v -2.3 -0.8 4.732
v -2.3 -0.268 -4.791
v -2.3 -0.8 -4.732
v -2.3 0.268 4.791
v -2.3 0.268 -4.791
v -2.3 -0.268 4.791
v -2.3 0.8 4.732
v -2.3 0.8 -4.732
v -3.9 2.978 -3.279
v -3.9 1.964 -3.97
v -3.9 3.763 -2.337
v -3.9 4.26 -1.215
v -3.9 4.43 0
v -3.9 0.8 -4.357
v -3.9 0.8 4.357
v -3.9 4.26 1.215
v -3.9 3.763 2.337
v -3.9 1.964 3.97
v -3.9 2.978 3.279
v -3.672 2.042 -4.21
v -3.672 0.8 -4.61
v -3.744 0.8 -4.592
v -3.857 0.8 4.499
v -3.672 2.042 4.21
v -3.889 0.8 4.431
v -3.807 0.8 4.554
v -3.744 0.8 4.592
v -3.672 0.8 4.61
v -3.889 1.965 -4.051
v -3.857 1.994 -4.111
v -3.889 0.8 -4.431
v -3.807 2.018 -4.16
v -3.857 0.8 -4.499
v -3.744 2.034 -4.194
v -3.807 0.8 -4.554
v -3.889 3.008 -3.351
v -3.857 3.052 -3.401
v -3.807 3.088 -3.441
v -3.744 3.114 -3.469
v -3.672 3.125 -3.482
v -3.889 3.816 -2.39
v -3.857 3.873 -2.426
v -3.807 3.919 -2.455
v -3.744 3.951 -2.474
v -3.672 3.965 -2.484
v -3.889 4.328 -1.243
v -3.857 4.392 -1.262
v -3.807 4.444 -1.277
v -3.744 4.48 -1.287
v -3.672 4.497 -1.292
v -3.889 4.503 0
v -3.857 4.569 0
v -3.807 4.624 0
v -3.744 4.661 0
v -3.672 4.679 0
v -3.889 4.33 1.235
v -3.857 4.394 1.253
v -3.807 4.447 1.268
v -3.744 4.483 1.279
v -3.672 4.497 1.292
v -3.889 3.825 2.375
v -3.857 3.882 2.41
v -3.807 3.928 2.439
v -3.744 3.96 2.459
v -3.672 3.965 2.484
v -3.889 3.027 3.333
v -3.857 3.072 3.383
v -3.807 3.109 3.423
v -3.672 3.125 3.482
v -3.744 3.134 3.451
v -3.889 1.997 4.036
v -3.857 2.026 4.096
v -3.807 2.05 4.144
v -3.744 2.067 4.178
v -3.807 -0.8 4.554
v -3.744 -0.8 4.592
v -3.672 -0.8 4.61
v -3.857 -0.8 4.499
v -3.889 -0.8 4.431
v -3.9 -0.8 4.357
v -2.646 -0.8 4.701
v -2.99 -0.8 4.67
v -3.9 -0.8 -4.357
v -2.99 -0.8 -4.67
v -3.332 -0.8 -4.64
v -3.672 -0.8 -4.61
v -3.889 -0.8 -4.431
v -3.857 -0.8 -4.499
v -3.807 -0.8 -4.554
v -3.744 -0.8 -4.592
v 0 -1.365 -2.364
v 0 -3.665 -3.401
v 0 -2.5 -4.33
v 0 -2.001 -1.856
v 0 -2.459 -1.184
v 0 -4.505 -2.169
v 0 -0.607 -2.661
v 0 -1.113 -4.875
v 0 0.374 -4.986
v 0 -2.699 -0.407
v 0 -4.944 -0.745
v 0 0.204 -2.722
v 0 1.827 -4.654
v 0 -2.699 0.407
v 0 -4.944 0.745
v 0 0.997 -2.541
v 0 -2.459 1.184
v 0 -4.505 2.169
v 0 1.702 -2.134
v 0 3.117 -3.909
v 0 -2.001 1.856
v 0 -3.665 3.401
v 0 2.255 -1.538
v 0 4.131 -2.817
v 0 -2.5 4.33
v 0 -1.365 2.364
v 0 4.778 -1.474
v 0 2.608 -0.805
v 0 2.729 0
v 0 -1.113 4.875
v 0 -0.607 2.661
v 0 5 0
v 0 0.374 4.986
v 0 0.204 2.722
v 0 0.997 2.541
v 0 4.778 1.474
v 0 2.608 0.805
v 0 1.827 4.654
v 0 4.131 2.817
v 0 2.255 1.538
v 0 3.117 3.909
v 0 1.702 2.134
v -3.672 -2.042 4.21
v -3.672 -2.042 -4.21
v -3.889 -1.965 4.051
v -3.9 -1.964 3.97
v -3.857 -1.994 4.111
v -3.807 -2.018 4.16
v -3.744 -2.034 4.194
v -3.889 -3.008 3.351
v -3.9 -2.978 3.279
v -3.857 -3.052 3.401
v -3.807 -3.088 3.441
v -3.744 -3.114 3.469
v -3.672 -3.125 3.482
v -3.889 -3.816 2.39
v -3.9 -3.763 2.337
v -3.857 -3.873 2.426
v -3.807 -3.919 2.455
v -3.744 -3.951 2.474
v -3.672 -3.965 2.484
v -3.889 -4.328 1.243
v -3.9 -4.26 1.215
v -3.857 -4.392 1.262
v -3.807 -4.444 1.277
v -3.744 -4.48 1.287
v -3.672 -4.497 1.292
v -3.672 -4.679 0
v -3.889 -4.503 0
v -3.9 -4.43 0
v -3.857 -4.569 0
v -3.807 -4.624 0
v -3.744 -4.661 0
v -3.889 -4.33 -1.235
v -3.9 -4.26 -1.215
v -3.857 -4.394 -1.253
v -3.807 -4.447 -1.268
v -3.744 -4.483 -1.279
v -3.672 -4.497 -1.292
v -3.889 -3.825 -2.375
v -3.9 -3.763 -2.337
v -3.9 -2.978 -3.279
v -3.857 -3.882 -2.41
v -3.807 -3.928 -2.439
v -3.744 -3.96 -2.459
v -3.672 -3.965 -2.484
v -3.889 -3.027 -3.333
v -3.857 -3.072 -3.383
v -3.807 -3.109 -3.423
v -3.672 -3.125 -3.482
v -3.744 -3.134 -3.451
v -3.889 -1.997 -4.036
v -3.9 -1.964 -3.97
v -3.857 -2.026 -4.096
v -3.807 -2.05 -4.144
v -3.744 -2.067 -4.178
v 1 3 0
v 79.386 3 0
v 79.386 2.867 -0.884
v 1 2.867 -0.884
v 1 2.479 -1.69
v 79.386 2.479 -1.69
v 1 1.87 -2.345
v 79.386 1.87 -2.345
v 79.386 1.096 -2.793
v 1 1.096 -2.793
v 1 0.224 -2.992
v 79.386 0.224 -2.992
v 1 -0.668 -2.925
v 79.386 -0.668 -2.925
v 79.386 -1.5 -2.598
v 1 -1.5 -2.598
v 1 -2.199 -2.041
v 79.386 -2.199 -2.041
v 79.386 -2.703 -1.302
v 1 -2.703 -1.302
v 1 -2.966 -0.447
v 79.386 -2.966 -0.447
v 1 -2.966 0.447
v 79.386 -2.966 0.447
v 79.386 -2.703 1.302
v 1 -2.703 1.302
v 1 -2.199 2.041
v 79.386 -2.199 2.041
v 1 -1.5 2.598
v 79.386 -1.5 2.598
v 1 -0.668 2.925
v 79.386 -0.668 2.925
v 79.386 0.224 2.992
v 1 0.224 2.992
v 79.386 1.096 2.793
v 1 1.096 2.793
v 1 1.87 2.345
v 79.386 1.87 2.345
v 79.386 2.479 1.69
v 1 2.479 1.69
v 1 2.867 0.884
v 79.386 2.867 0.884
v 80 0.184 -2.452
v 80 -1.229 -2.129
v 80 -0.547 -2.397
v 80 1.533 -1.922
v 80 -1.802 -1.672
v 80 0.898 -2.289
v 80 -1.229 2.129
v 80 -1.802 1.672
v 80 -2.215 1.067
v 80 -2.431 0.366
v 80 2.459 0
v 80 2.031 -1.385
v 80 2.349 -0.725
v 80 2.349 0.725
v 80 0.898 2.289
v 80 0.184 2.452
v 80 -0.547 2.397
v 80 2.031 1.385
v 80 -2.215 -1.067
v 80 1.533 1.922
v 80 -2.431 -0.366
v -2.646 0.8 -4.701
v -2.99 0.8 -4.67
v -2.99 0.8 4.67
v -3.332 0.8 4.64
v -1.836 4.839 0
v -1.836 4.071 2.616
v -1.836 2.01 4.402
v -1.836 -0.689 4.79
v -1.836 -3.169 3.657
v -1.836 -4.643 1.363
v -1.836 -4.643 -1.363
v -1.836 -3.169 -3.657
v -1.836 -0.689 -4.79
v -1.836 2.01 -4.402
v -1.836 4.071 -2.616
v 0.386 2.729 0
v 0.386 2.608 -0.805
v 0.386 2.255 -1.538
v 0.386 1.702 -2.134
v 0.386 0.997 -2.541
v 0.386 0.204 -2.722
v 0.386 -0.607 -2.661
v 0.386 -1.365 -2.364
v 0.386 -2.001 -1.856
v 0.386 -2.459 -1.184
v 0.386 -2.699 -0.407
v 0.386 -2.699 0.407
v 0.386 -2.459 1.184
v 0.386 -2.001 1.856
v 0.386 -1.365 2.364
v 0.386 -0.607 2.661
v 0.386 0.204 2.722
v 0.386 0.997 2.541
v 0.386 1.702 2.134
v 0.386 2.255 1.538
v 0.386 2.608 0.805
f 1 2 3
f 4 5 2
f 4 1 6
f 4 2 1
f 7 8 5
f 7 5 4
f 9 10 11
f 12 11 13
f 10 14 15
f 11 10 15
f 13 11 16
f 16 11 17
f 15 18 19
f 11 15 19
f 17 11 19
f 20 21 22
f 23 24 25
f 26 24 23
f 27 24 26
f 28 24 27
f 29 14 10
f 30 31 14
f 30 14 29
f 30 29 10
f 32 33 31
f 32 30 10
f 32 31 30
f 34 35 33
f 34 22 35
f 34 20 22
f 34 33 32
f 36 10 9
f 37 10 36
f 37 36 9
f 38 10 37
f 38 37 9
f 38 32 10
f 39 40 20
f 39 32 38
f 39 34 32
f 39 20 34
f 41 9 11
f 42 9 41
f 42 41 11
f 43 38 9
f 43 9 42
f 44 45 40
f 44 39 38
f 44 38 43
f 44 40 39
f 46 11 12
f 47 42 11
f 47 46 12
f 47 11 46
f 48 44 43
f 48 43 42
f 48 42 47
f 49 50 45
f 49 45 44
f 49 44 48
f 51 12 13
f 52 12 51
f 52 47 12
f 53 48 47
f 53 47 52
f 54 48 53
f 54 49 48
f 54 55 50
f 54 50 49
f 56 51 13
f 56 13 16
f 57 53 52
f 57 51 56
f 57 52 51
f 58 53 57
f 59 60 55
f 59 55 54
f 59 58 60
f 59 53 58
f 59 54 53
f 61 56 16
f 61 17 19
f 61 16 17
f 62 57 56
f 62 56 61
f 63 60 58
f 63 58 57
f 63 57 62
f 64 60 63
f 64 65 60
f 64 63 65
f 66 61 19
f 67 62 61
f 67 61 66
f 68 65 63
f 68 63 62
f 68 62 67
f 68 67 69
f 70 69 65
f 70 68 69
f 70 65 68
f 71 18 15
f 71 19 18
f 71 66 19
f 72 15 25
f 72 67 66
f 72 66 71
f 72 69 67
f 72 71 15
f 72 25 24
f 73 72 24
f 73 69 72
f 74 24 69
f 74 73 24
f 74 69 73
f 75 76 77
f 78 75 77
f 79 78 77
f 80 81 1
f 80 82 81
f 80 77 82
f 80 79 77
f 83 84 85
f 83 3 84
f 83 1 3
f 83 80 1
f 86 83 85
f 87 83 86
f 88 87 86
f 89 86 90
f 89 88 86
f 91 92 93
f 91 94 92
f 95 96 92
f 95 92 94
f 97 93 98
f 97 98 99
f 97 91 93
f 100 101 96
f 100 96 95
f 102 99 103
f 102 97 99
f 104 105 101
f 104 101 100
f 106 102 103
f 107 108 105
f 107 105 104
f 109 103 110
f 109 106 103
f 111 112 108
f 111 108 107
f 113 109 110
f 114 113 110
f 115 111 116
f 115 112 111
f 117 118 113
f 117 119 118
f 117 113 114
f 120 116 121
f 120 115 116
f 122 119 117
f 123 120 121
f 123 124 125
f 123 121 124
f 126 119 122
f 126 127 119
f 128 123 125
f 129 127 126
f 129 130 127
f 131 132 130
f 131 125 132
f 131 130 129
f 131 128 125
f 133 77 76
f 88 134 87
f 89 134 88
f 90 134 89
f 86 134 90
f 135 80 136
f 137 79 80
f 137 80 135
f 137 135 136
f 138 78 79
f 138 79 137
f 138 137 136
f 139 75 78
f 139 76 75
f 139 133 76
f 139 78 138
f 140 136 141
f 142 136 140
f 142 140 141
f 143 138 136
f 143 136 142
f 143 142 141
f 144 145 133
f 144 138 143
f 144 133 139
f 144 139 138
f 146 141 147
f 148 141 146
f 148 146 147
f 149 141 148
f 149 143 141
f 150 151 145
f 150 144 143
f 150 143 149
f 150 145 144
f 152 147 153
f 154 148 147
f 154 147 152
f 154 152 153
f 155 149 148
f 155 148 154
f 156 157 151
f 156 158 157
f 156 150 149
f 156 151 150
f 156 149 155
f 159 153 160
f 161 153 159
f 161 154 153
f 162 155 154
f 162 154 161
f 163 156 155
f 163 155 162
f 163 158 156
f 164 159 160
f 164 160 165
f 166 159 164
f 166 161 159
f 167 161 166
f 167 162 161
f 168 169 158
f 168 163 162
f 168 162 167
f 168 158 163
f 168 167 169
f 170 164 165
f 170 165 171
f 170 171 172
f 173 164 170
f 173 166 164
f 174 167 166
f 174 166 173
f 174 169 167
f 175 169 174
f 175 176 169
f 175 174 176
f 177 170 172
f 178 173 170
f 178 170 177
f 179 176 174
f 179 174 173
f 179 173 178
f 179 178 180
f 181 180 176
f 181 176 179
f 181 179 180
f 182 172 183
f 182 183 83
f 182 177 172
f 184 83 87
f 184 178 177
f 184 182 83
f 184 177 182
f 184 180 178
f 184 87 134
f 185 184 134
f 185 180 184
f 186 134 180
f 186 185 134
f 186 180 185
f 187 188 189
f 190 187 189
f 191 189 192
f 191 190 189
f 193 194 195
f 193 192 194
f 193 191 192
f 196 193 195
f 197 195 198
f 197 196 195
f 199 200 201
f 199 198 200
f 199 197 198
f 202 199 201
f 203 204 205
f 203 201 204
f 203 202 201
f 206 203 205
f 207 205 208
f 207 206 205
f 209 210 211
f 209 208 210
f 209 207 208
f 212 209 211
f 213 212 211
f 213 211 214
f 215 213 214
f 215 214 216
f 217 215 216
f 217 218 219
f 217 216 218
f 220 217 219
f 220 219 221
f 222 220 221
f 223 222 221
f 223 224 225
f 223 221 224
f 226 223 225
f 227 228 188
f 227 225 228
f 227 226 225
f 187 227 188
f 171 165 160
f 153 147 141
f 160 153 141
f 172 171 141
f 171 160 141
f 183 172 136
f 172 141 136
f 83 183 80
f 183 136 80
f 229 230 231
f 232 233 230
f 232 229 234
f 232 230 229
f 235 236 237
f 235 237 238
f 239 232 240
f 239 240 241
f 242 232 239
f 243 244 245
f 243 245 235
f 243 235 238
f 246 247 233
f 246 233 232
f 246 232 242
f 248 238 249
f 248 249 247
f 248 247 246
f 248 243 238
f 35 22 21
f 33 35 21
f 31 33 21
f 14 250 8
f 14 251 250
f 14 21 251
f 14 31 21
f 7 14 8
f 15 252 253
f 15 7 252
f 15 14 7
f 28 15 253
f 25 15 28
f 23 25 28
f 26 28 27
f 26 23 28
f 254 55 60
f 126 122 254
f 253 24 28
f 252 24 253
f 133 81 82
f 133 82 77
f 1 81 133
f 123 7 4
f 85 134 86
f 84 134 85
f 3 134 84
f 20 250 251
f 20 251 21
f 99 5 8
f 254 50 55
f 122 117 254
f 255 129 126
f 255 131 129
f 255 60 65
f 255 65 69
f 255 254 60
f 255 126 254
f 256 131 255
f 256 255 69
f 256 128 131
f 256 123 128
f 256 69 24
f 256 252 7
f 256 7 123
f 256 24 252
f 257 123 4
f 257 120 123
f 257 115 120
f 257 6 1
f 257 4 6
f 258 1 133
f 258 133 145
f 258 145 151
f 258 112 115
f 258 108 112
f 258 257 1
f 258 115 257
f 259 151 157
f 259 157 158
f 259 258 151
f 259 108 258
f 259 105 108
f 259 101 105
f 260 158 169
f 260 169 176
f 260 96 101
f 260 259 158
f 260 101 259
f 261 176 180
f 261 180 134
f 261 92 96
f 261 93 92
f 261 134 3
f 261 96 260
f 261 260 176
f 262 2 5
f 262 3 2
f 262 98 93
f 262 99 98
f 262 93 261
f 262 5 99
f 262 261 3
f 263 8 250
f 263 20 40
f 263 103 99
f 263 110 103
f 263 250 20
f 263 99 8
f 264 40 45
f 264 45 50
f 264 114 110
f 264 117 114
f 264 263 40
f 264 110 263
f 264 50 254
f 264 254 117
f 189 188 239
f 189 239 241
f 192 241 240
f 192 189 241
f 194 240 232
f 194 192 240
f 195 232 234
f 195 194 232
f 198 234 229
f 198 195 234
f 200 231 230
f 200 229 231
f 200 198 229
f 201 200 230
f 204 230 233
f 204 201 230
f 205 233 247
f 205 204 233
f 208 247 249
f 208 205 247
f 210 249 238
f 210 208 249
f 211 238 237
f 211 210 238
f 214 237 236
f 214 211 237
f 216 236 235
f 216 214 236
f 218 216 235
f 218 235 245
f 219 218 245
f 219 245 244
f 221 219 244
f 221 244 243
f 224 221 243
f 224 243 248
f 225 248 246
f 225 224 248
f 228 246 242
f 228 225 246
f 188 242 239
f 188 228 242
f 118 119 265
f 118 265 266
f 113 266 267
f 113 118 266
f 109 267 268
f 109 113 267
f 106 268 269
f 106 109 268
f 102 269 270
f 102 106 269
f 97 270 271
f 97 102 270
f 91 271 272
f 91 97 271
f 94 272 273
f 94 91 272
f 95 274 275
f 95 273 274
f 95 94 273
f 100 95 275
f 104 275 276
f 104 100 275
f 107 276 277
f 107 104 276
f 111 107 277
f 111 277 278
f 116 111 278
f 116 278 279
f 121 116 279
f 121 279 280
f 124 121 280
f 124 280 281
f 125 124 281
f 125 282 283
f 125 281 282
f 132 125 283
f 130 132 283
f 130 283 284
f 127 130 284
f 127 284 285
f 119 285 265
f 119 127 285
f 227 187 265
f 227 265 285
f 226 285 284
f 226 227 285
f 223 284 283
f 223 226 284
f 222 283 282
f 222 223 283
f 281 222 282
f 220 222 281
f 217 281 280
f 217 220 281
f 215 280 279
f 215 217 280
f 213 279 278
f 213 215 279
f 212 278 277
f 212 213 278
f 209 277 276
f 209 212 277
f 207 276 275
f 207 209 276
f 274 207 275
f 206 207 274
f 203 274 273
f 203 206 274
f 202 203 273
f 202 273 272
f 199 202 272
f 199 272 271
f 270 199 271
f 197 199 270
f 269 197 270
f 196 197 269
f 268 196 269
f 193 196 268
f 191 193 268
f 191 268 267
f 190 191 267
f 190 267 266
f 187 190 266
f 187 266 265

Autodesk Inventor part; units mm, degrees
ref_plane "YZ Plane" through (0, 0, 0) normal (1, 0, 0) x (0, 1, 0)
ref_plane "XZ Plane" through (0, 0, 0) normal (0, 1, 0) x (-1, 0, 0)
sketch "Skizze1" plane through (0, 0, 0) normal (0, 0, 1) x (1, 0, 0)
  line L0 (-3.9, 0) -> (80, 0)
  line L1 (80, 0) -> (80, 3)
  line L2 (80, 3) -> (1, 3)
  line L3 (1, 3) -> (0.3864, 2.7294)
  line L4 (0.3864, 2.7294) -> (0, 2.7294)
  line L5 (0, 2.7294) -> (0, 5)
  line L6 (-20.68, 0) -> (96.78, 0) projected
  line L7 (0, -1) -> (0, 6) projected
  line L8 (-3.9, 0) -> (-3.9, 4.6588)
  line L9 (0, 5) -> (-3.9, 4.6588)
  line L10 (1, 3) -> (0, 3) construction
  dimension "d0" = 80
  dimension "d1" = 79
  dimension "d2" = 0.6136
  dimension "d3" = 3.9
  dimension "d4" = 6
  dimension "d5" = 5.4587
  dimension "d9" = 10
  dimension "d10" = 5
revolve "Körper" add sketch "Skizze1" angle 360 about axis through (-3.9, 0, 0) along (1, 0, 0)
sketch "Skizze2" plane through (-3.9, 0, 0) normal (-1, 0, 0) x (0, 0, 1)
  circle A0 centre (0, 0) radius 5 projected
  line L0 (0, 0) -> (0, 4.6588) projected
  line L1 (-5, 0.8) -> (5, 0.8)
  line L2 (5, 0.8) -> (5, -0.8)
  line L3 (5, -0.8) -> (-5, -0.8)
  line L4 (-5, -0.8) -> (-5, 0.8)
  line L5 (-5, 0) -> (5, 0) construction
  line L6 (0, 0.8) -> (0, -0.8) construction
  dimension "d11" = 1.6
  dimension "d12" = 10
fillet "Rundung1" radius 0.25 1 edges at (-3.9, -4.6588, 0)
extrude "Loch" cut sketch "Skizze2" against normal blind 1.6 contours A0 L3 L1 | L2 L3 A0 | A0 L1 L2 | A0 L4 L1 | L3 L4 A0
thread "Gewinde" size "M6x1" class "6g" standard "ISO Metric profile" full length
chamfer "Fase1" distance 0.5413 distance2 0.6136 1 edges at (80, -3, 0) measured on face at (80, 0.8631, 0.1984)
ref_plane "Work Plane1" through (30.1625, 0, 0) normal (0, 0, -1) x (1, 0, 0)
equation "\"d11\" = SBR"
equation "\"d12\" = KOD"
equation "\"d14\" = RR"
equation "\"d19\" = STI"
equation "\"d15\" = GEL"
equation "\"d17\" = -0.5 * SPD + 0.5 * GD"
equation "\"d3\" = KOH"
equation "\"d4\" = GD"
equation "\"d5\" = BDM"
equation "\"d9\" = KOD"
equation "\"d10\" = KEWI"
equation "\"GD\" = 6"
equation "\"GEL\" = 38"
equation "\"KOD\" = 10"
equation "\"KOH\" = 3.9"
equation "\"GAL\" = 0.61345 * PTC"
equation "\"SPD\" = 4.91747"
equation "\"BDM\" = 5.45873"
equation "\"GUL\" = 0.61345 * PTC"
equation "\"RR\" = 0.25"
equation "\"SBR\" = 1.6"
equation "\"STI\" = 1.6"
equation "\"KEWI\" = 5deg"
equation "\"PTC\" = 1"
equation "\"THREADDIA\" = 6"
equation "\"TOA\" = 30deg"
equation "\"NND\" = 6"
equation "\"GD1\" = THREADDIA - 1.2269 * PTC"
properties part number "DIN 84 - M6 x 60" material "Stahl, weich"
